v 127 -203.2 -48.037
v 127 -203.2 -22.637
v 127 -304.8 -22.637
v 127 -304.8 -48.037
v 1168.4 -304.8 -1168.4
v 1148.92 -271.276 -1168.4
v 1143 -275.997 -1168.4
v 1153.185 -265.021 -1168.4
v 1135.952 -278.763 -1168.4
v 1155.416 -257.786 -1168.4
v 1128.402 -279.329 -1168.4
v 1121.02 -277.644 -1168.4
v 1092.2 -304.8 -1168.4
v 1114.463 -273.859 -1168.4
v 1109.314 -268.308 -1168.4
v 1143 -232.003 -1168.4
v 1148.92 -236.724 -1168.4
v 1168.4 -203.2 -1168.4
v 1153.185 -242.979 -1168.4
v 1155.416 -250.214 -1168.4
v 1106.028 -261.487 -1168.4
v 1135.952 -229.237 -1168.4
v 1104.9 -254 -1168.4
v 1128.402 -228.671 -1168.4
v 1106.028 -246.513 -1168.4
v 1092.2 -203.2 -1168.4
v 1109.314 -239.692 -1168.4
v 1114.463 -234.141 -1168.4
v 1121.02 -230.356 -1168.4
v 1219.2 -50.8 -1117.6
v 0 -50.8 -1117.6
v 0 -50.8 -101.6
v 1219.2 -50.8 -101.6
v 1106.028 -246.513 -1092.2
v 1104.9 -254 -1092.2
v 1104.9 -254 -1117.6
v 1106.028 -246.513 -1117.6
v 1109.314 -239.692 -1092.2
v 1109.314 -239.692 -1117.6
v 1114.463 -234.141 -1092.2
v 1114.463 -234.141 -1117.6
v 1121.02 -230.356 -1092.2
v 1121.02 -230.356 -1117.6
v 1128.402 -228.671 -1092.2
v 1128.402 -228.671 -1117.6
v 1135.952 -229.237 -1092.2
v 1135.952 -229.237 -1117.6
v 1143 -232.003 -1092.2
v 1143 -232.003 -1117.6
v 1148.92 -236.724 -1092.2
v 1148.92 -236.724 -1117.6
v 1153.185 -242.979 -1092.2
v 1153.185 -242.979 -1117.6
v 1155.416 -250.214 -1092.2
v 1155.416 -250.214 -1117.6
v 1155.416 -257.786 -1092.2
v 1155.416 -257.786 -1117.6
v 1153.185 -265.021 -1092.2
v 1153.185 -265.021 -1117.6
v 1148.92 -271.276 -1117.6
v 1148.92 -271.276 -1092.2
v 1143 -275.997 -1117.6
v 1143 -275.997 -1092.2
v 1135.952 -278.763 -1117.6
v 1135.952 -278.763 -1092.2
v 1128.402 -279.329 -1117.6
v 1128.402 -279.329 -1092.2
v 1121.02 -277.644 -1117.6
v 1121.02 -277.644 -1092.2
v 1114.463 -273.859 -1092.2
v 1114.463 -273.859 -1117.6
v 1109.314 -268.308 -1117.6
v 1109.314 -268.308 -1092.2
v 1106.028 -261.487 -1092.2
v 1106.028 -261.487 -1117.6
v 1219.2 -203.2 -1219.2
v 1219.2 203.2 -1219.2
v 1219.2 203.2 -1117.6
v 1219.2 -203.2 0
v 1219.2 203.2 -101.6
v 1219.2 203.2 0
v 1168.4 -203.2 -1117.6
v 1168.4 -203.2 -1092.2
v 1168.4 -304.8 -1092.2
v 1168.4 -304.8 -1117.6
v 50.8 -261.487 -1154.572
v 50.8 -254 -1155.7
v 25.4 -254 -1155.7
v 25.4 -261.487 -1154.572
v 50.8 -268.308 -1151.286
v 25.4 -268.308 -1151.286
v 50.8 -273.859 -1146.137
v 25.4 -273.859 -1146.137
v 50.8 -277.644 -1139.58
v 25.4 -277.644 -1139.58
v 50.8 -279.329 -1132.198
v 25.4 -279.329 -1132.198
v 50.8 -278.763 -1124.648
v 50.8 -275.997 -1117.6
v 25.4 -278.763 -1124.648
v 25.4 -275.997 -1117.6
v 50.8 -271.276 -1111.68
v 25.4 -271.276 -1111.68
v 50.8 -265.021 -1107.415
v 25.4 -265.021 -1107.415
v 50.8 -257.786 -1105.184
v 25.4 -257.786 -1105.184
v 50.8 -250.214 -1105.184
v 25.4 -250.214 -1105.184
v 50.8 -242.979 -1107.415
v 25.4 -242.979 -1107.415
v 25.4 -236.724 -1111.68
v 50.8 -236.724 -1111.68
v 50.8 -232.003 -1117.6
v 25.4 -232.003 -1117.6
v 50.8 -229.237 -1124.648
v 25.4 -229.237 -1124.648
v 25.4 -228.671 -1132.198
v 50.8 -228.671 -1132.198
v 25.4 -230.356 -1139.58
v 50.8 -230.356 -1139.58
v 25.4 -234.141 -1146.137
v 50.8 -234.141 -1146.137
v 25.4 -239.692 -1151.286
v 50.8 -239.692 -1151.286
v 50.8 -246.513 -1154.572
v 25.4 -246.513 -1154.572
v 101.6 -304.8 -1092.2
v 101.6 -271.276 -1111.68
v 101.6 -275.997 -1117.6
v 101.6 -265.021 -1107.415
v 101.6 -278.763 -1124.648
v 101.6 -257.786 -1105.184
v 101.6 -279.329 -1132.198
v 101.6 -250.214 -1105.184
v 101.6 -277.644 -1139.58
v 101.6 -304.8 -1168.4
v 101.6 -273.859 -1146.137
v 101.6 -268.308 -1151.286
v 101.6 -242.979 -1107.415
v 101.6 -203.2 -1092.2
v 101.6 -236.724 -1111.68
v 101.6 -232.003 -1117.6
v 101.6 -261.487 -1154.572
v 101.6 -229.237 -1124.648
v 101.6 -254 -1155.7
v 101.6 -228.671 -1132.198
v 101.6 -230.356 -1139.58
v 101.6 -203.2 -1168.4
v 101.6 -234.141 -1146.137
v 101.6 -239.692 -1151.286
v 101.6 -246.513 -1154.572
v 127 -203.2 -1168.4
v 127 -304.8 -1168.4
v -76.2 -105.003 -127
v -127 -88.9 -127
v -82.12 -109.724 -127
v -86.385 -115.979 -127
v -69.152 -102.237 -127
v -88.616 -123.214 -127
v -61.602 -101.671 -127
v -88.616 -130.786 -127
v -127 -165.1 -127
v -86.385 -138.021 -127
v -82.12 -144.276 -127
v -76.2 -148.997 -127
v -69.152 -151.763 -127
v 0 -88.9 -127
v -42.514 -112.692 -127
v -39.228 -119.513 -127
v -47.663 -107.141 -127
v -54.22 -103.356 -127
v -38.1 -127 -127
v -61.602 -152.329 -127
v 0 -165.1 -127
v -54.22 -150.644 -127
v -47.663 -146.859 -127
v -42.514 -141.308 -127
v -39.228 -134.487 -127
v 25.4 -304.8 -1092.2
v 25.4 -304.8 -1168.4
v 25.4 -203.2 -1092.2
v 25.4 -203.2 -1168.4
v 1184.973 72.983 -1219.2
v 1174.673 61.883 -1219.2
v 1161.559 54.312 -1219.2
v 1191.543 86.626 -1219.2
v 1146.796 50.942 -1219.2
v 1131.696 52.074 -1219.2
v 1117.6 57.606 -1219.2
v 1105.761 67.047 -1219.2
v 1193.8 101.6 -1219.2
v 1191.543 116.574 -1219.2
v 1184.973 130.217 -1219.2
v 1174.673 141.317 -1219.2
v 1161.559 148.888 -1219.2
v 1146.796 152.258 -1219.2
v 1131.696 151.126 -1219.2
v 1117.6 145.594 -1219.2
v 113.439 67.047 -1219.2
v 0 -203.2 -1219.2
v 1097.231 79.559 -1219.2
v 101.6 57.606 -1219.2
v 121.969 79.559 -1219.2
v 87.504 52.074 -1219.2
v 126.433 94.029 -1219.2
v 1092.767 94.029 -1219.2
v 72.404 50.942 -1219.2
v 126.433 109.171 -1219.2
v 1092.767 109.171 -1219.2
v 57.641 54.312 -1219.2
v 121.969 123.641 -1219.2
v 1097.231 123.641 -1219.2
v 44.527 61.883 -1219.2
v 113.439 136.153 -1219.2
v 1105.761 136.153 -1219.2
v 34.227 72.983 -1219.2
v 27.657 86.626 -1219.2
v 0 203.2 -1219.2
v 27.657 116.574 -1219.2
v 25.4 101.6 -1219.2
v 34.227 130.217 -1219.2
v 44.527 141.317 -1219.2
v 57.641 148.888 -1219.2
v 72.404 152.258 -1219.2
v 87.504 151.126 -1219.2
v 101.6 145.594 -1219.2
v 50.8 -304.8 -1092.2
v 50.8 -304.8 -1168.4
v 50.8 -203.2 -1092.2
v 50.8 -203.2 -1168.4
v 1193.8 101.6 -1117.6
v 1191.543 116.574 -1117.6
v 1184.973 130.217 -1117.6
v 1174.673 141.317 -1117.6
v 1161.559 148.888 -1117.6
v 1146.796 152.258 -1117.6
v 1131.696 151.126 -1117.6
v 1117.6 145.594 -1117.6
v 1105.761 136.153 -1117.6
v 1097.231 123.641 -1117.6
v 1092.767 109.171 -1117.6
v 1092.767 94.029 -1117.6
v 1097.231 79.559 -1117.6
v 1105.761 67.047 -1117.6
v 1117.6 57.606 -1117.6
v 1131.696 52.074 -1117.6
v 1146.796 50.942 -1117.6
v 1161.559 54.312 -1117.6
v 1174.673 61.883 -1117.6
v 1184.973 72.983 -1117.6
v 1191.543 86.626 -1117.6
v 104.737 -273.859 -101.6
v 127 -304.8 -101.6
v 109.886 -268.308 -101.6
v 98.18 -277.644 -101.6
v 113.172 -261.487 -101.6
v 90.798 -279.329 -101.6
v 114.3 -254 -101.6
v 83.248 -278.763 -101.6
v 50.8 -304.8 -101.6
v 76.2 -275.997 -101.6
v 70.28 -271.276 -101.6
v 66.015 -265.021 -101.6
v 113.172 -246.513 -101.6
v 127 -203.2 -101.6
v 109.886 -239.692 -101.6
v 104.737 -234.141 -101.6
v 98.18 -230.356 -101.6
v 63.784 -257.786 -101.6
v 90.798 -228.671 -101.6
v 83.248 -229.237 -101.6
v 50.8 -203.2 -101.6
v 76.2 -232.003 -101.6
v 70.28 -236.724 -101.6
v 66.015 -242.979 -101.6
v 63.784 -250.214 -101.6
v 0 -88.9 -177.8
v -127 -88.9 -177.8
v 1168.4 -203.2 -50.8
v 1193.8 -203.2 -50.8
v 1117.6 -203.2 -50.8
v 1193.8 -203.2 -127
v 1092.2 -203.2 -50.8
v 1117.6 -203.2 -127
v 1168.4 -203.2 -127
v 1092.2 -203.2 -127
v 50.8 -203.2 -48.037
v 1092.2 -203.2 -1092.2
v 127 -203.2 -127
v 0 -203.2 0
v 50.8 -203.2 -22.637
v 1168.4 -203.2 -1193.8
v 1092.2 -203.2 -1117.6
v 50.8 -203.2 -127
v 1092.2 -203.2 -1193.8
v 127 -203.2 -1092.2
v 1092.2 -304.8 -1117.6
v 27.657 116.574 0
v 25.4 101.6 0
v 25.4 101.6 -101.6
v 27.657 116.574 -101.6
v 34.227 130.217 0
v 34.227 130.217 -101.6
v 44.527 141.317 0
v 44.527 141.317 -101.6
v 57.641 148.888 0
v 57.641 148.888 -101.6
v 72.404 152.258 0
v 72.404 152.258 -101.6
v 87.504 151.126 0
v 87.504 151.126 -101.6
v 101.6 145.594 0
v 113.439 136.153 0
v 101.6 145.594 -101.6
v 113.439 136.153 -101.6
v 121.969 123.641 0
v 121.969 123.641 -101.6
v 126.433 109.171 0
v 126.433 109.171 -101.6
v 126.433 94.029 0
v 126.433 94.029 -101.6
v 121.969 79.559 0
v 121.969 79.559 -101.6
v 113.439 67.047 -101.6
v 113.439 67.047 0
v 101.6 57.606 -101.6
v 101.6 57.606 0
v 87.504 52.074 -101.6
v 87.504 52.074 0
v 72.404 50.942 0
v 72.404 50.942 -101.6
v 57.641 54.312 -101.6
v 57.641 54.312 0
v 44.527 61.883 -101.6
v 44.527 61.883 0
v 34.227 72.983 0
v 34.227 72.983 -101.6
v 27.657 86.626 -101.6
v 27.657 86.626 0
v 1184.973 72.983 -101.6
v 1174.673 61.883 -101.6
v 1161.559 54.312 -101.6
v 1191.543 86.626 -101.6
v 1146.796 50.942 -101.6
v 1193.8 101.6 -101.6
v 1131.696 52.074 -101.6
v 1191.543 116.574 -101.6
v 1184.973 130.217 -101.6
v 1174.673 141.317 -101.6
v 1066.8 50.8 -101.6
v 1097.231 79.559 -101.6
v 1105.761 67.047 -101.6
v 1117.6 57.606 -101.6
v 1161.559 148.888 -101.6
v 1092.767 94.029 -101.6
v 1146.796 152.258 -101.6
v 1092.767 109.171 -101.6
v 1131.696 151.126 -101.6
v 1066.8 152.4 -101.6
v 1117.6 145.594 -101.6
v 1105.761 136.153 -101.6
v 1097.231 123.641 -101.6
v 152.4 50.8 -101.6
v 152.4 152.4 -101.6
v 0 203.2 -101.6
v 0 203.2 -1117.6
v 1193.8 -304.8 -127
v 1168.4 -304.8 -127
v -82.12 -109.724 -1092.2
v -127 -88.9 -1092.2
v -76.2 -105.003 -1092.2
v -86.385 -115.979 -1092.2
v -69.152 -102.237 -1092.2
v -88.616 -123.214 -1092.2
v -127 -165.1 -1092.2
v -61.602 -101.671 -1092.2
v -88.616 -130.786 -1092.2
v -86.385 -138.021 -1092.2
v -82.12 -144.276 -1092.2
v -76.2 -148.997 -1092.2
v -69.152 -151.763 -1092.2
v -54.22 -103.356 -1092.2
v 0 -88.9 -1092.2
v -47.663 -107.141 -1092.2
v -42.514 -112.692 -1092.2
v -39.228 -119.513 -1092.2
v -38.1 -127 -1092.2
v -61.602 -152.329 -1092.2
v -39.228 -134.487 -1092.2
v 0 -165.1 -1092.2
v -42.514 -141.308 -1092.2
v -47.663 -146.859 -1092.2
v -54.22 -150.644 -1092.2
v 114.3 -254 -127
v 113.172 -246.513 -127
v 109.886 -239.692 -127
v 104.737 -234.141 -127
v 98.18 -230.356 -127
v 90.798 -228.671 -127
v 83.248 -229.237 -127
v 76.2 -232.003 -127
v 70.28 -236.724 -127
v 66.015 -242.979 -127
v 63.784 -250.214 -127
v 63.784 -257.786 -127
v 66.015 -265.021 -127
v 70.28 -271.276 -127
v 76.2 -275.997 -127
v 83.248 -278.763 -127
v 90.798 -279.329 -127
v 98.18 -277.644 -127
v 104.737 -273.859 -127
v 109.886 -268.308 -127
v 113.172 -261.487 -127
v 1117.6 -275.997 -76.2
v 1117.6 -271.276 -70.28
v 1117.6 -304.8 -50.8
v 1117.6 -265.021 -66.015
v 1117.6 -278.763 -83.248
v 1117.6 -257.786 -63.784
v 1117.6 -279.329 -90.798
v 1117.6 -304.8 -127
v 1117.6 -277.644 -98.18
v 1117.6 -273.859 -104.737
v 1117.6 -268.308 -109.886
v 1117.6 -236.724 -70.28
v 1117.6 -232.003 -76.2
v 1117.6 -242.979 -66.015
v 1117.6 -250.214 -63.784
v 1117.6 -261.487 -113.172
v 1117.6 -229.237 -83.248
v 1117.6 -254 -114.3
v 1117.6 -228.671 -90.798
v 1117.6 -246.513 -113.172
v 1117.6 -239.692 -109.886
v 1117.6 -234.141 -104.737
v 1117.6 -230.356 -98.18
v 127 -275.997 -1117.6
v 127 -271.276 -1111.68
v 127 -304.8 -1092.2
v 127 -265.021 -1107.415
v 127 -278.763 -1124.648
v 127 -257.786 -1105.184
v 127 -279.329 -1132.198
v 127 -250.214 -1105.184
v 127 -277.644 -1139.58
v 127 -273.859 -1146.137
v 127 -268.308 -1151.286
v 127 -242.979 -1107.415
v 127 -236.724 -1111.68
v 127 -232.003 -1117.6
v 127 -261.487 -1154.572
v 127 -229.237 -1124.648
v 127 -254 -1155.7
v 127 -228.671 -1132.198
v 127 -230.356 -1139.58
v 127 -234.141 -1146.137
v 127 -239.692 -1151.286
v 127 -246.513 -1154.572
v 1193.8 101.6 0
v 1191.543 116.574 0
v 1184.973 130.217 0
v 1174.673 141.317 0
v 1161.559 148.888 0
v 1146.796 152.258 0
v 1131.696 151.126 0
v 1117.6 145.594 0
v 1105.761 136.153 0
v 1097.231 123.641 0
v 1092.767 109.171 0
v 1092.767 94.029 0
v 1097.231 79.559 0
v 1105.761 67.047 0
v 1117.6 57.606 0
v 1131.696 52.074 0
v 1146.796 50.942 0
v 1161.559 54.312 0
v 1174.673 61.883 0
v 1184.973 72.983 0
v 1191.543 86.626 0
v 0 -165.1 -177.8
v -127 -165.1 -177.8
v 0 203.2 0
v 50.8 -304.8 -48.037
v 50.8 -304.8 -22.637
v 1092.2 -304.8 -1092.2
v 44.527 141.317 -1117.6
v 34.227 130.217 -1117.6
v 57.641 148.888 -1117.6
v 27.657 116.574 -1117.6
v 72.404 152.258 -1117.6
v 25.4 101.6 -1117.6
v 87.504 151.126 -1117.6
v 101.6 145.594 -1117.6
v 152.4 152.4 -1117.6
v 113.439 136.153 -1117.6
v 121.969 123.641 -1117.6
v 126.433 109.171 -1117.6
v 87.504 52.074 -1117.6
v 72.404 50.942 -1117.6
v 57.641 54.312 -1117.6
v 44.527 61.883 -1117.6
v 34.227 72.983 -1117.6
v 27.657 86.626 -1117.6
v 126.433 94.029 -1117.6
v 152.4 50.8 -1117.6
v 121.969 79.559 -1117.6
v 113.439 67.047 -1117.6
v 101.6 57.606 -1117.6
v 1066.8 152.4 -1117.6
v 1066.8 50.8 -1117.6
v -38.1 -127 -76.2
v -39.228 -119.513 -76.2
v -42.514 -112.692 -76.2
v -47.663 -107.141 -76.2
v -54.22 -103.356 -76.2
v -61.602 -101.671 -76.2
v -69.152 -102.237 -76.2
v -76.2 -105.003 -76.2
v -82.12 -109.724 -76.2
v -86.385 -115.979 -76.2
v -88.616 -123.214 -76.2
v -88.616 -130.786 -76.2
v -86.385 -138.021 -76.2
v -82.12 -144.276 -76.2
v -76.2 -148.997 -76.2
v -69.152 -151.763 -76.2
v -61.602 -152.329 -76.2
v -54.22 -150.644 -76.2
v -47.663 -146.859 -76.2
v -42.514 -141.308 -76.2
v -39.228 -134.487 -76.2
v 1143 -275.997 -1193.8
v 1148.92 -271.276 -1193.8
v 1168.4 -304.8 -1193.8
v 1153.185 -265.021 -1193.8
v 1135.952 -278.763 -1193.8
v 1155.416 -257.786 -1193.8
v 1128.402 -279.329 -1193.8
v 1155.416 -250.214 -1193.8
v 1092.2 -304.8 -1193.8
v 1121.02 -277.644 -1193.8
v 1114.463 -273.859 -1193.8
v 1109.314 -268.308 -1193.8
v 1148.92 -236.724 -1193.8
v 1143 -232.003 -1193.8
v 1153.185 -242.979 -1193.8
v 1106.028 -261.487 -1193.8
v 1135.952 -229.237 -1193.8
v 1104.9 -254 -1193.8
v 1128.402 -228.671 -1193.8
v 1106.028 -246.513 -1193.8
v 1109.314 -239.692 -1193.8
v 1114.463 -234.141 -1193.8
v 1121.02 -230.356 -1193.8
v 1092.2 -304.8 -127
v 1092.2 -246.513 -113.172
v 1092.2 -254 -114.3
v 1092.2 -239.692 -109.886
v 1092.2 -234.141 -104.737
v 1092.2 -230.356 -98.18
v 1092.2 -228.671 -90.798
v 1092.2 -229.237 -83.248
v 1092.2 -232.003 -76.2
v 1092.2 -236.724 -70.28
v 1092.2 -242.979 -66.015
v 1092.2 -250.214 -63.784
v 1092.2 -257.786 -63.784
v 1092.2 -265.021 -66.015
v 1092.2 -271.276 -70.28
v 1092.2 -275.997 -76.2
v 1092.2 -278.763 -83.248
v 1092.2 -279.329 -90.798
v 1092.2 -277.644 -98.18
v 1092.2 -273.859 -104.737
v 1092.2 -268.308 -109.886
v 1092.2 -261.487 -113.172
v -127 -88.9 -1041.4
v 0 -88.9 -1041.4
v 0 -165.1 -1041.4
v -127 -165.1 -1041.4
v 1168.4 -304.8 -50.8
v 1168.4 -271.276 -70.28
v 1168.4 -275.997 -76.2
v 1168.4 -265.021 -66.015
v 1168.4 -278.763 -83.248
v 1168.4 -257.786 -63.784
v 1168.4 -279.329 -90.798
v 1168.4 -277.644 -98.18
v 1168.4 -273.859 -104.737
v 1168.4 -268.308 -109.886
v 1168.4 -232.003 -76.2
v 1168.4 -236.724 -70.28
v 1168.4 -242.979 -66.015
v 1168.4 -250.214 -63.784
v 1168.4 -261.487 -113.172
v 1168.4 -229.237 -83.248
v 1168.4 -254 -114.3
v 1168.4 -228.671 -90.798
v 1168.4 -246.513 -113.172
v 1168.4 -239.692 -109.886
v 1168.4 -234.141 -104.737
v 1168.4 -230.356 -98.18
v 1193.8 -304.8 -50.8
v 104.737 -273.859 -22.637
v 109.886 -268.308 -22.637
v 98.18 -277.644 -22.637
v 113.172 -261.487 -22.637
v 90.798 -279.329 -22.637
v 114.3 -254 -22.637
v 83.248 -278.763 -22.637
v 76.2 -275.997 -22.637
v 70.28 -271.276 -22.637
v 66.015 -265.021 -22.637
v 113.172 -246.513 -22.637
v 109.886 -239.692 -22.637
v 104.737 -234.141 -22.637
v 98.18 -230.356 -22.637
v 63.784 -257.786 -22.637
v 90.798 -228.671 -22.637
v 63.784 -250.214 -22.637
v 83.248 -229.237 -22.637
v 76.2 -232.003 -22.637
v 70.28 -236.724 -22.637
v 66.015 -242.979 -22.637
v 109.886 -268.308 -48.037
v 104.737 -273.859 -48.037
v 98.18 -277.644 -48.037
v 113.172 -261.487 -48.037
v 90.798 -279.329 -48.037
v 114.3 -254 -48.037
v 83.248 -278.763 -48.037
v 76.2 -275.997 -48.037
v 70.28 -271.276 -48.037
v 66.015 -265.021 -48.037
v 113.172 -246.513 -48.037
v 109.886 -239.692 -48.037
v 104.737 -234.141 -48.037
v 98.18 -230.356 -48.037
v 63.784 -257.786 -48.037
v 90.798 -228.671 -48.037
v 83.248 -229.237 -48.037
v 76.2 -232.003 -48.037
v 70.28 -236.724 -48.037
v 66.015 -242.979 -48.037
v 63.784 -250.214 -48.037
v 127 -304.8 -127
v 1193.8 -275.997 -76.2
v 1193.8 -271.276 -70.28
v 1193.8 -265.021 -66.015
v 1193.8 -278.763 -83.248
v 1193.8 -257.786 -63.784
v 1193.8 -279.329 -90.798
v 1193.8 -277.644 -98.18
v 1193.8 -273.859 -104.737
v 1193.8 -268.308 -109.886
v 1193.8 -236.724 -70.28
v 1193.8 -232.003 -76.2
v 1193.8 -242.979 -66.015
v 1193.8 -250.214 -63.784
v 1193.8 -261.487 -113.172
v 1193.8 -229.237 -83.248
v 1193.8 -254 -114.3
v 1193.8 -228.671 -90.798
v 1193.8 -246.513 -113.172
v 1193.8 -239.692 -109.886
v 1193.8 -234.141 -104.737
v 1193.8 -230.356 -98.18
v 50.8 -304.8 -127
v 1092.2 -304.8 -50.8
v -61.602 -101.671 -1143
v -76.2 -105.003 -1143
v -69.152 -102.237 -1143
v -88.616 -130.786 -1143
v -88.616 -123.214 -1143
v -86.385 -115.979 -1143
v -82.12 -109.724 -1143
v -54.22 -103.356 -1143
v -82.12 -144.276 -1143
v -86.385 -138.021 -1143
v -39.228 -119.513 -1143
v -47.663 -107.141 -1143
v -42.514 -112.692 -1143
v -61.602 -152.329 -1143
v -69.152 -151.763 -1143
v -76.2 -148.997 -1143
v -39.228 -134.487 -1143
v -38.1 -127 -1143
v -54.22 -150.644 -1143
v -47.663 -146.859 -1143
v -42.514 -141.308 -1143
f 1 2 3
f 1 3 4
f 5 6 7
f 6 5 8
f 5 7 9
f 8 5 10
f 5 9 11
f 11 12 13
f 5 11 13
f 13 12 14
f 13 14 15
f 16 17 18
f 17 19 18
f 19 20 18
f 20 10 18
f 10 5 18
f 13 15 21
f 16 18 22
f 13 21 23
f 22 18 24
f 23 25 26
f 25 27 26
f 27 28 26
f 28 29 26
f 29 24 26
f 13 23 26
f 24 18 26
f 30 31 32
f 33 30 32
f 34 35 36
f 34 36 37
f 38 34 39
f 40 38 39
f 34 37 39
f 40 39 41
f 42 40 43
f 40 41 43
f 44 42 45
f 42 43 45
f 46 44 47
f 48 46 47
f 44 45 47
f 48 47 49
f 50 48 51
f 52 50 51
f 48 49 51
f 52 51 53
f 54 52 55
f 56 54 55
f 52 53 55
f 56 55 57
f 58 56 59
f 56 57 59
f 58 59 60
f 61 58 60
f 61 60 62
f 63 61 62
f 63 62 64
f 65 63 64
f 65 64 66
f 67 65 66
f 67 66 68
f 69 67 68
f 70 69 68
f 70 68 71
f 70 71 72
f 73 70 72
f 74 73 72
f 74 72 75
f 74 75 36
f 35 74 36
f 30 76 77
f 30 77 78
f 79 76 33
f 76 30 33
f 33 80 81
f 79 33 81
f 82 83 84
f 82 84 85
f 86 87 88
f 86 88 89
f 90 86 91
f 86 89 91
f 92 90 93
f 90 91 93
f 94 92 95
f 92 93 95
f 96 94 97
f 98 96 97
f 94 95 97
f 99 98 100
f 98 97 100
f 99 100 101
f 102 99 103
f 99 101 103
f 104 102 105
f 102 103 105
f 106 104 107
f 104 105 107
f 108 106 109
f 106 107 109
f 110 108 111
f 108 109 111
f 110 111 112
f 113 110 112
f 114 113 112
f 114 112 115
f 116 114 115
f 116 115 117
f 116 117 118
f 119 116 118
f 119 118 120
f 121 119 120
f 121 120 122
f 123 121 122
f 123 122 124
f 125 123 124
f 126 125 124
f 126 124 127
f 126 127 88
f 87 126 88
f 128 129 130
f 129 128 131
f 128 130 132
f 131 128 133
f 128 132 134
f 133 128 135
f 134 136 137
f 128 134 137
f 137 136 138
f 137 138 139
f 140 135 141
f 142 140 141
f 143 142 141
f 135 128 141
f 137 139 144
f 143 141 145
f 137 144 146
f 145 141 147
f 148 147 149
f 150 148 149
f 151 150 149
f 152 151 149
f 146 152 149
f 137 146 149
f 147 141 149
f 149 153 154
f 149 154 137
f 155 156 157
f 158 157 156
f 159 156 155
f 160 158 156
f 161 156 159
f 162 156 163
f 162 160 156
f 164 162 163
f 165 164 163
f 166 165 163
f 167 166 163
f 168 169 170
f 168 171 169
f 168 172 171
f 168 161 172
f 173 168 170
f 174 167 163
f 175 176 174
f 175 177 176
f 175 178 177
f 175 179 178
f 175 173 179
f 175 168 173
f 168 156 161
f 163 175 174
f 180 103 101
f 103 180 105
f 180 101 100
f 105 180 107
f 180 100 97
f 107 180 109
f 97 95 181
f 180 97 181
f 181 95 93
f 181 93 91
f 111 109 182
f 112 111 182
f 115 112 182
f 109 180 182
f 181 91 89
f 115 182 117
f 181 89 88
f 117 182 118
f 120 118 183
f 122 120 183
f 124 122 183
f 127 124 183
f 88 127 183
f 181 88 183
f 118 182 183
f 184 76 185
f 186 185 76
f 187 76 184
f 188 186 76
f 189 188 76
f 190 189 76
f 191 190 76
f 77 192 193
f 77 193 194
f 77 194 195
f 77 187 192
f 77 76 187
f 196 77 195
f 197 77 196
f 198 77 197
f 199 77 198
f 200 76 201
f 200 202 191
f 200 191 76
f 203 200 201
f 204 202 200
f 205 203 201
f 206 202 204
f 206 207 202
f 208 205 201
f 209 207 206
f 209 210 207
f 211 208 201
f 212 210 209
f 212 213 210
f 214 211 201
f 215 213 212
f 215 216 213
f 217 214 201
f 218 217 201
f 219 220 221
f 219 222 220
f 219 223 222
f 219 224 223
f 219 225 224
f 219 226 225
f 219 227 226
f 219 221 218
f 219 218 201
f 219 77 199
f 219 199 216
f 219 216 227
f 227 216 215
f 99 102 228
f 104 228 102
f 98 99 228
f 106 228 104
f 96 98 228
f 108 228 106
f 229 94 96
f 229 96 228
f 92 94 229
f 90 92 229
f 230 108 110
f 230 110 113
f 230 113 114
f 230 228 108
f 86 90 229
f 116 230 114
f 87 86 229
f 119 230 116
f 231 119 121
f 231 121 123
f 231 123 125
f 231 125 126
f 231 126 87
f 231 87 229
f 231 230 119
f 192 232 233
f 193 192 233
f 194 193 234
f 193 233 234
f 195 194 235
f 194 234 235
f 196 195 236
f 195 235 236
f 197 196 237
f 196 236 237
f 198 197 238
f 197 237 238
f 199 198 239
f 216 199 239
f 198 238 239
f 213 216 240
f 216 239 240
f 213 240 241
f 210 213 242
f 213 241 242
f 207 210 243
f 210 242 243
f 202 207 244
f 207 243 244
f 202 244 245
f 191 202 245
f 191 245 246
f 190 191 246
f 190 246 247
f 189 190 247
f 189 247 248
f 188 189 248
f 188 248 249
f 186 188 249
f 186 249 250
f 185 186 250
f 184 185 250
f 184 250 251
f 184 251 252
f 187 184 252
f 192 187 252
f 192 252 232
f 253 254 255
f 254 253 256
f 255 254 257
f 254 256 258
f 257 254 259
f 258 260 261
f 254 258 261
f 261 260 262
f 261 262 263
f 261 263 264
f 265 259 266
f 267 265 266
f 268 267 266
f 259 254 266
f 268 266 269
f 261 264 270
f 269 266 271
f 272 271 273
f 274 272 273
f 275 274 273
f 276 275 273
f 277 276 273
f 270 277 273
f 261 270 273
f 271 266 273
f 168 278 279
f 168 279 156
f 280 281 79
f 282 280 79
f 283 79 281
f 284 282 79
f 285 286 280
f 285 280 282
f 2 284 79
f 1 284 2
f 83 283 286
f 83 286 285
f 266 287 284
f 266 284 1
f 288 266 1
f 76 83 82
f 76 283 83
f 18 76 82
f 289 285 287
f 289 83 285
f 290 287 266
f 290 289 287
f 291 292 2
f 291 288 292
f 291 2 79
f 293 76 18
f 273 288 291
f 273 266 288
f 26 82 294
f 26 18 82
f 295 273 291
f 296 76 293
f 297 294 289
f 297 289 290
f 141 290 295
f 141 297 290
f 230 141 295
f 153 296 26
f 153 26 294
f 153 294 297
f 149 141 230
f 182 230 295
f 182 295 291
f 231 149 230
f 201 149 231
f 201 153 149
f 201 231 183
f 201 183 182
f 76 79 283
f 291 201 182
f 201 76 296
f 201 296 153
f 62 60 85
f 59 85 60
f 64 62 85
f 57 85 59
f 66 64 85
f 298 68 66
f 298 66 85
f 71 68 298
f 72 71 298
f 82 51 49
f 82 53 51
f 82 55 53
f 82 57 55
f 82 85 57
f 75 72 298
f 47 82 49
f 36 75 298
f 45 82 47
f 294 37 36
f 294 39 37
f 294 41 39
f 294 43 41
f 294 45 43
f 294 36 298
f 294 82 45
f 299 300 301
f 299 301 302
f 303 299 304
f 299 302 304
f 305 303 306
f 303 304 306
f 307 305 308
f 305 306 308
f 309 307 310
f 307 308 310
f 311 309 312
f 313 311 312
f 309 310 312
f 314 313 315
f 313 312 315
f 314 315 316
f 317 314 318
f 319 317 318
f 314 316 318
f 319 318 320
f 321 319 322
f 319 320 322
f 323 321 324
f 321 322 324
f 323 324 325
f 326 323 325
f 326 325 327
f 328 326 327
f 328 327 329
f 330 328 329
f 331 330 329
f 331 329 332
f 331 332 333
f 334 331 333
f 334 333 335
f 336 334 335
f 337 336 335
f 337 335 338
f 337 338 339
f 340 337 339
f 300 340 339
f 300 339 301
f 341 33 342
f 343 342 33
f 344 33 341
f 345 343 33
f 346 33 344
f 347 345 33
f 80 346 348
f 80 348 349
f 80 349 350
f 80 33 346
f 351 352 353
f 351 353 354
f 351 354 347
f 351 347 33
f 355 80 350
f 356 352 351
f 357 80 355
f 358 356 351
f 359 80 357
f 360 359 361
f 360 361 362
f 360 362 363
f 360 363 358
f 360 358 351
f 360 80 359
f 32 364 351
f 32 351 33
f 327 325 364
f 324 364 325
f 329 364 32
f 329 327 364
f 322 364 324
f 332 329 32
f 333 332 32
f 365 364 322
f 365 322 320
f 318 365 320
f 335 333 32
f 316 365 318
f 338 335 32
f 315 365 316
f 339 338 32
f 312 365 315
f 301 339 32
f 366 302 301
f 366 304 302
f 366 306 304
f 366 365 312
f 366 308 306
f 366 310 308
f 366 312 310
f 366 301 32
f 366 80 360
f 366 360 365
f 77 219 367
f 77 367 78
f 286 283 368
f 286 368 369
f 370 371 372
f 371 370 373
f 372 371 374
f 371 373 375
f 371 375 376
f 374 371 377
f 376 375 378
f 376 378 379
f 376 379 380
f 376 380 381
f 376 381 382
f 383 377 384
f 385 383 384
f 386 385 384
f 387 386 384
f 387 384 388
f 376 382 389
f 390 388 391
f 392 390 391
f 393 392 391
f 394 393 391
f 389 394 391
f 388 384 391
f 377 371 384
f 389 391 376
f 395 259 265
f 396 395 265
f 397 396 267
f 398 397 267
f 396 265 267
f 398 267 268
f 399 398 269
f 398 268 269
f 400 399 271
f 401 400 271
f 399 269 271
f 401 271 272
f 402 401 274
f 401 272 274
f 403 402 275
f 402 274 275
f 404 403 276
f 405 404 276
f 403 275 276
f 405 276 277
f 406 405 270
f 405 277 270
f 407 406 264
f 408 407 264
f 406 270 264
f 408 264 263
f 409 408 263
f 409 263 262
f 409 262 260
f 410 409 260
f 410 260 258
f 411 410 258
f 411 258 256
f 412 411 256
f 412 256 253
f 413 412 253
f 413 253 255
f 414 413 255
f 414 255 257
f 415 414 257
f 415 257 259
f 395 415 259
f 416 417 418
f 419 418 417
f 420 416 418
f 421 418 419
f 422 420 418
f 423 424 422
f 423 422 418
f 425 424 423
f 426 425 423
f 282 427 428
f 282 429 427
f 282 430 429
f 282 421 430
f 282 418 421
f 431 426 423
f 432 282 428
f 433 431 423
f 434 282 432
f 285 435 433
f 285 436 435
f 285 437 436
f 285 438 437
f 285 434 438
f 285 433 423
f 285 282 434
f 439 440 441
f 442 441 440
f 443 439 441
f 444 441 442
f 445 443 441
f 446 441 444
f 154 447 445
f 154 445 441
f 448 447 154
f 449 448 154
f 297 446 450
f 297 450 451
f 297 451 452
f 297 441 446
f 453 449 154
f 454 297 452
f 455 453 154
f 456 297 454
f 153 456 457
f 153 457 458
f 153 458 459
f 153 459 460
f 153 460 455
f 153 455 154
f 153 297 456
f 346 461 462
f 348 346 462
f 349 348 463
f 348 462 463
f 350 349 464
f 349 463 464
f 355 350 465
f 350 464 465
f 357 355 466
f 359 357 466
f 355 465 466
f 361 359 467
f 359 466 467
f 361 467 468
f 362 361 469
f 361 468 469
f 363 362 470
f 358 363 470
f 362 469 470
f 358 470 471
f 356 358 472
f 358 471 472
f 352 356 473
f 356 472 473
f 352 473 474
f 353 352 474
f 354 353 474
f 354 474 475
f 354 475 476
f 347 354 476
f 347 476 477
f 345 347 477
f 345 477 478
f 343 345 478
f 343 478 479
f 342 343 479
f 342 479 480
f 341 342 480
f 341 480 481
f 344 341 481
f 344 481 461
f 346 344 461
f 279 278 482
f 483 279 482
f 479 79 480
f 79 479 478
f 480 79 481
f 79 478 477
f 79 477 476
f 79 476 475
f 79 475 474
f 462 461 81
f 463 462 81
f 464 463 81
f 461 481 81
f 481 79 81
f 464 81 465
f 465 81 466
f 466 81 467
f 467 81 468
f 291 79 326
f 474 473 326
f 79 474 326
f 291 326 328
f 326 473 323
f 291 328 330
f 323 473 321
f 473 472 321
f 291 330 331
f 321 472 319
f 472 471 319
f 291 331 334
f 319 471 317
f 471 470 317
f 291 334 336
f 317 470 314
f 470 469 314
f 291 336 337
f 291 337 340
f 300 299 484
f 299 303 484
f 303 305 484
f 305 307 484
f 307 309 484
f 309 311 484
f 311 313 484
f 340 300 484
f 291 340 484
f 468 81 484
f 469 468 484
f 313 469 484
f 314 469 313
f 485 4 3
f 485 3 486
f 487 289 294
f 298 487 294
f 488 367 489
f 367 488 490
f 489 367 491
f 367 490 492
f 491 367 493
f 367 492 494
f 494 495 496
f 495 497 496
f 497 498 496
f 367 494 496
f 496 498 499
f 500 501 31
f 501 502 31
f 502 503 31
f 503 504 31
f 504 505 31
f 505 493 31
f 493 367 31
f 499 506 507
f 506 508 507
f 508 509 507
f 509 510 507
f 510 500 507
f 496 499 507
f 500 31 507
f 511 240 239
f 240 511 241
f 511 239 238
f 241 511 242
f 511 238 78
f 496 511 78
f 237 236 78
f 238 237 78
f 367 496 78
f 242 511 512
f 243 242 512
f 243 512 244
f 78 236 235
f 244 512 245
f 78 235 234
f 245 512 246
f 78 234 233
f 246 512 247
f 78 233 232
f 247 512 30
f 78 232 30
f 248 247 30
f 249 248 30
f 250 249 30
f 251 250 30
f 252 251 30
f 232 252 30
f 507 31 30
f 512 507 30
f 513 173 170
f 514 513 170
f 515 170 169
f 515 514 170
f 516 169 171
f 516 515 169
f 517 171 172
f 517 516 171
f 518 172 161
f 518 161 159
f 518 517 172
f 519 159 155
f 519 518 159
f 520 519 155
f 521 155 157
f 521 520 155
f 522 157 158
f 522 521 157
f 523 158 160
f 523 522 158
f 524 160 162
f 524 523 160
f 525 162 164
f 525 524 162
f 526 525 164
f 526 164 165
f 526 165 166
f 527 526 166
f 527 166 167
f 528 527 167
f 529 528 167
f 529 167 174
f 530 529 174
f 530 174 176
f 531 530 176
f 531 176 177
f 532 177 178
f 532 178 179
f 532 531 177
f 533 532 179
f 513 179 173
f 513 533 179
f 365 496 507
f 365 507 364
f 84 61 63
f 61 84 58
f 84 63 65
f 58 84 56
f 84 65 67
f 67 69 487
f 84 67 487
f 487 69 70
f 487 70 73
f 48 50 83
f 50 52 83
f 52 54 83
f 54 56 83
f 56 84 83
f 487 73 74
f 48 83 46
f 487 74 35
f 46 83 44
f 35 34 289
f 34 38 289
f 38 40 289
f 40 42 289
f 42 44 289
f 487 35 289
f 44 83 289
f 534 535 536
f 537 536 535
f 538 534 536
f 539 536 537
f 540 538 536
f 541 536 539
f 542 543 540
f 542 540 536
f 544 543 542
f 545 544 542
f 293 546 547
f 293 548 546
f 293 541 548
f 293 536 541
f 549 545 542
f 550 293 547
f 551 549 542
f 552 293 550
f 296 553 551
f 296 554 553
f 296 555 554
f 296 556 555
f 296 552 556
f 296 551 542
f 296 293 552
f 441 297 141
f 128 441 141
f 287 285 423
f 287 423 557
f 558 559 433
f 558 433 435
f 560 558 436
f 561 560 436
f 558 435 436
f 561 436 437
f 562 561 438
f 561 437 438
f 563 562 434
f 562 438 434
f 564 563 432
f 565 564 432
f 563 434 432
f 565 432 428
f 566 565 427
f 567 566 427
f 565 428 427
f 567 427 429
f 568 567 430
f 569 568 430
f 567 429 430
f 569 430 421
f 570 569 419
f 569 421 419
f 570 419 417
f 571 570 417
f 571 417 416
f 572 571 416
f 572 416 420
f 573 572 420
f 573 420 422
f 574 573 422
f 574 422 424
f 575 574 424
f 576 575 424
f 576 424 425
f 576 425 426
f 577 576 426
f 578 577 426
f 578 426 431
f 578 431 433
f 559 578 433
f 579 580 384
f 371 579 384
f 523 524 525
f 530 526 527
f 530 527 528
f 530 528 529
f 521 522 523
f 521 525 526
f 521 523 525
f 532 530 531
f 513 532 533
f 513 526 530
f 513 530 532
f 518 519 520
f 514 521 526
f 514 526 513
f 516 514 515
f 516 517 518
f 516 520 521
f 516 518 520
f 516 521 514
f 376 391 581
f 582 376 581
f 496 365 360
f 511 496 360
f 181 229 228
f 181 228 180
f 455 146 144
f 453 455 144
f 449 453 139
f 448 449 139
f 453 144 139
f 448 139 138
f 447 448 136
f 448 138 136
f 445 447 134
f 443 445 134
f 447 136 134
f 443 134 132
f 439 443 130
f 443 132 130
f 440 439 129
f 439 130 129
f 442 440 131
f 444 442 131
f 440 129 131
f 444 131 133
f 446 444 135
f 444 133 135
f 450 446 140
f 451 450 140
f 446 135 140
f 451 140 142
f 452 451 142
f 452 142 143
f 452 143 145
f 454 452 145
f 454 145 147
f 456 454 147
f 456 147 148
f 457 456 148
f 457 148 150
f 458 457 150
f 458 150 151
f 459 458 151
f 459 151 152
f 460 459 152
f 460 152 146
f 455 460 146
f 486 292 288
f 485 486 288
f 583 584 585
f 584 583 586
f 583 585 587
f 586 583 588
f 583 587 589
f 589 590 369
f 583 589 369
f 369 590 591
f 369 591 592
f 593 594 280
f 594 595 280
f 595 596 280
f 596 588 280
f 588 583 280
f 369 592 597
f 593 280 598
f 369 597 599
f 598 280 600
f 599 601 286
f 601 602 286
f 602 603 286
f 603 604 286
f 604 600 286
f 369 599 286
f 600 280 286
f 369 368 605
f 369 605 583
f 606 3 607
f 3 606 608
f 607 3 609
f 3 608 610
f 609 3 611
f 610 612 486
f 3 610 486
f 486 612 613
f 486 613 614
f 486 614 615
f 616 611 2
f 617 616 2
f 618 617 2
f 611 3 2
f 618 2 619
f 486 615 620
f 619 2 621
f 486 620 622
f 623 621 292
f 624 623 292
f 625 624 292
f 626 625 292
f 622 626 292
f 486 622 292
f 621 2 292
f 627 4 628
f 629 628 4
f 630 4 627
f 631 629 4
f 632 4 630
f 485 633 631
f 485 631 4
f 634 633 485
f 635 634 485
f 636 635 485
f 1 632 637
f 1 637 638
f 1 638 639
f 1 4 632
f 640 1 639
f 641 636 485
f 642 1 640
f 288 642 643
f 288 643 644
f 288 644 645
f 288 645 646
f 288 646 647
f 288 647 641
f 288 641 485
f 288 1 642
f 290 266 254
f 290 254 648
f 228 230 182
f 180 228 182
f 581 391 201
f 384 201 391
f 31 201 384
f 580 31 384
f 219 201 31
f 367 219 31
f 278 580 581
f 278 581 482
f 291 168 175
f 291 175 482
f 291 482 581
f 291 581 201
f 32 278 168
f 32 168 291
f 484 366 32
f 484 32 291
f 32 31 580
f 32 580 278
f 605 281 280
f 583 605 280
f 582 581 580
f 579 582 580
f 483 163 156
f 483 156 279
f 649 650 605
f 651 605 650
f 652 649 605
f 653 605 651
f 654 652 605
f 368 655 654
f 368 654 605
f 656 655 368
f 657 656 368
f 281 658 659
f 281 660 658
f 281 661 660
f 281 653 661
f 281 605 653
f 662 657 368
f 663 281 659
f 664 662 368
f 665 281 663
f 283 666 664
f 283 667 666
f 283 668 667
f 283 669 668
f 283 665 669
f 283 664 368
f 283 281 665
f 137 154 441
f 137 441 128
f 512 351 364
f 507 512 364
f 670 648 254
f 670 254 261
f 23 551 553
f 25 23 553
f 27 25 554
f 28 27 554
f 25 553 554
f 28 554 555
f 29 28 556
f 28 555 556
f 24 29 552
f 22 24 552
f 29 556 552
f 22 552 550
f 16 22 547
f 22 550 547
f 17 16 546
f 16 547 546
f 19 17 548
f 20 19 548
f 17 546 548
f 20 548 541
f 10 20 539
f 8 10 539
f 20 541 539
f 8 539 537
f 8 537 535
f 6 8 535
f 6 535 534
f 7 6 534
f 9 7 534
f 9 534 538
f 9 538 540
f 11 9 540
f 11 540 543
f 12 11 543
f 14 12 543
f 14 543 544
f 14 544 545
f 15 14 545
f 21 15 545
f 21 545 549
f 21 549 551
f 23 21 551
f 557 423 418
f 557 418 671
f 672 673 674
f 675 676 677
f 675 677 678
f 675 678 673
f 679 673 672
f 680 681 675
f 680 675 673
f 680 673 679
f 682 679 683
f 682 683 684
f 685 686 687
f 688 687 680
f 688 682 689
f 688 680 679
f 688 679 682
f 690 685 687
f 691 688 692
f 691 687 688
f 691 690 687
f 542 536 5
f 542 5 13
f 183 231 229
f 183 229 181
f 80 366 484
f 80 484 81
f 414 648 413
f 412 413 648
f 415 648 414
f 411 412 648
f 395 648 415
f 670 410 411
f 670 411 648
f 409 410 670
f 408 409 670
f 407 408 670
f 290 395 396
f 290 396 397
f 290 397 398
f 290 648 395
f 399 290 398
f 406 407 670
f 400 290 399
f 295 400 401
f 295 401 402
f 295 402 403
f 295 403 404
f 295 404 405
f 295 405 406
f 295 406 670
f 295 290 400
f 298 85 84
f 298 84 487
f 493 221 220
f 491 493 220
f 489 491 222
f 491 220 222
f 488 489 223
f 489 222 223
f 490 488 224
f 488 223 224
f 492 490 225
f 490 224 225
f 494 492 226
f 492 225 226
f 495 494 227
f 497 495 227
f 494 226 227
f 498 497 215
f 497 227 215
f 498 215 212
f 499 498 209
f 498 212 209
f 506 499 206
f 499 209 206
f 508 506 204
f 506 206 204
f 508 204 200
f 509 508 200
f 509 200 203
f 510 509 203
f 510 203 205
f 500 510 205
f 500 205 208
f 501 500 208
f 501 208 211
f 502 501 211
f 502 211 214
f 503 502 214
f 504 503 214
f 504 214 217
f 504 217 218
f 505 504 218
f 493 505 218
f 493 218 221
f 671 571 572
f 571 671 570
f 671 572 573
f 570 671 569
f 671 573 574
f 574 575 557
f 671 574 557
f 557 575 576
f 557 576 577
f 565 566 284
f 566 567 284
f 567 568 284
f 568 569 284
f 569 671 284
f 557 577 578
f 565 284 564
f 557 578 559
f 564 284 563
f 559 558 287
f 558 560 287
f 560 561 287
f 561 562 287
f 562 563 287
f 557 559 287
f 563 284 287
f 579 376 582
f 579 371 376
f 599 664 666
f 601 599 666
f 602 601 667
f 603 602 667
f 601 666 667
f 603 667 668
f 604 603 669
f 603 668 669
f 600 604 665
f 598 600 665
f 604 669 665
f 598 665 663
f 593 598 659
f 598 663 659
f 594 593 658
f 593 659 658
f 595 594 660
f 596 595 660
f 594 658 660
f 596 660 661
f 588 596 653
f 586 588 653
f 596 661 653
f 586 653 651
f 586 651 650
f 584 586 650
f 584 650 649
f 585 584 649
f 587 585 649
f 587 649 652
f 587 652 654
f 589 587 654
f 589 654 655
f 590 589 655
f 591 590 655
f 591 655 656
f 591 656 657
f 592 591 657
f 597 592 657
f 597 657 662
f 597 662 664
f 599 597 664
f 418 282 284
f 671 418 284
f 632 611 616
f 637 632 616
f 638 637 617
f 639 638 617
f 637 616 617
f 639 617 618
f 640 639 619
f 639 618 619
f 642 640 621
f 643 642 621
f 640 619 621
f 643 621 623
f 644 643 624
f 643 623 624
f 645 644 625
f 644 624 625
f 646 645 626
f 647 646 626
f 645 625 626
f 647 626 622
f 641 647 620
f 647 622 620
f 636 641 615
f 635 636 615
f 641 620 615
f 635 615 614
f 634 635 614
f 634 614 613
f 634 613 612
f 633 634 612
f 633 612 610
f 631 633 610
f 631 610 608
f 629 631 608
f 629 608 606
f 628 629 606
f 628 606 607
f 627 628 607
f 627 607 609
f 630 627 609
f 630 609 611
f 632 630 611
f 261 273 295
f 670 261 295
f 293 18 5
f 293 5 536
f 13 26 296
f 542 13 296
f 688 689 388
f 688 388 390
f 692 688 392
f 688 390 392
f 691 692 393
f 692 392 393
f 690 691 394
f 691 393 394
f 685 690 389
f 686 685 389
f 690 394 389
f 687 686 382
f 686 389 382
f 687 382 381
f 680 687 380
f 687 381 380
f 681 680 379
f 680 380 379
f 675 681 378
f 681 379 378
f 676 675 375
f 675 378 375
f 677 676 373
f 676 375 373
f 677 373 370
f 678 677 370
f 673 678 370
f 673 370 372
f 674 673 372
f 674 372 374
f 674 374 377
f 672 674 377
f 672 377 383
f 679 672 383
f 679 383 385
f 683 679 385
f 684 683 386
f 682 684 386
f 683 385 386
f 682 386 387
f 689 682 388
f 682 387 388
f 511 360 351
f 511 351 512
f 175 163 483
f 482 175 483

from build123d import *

# Parameters (mm, degrees)
BOSS_EXTRUDE1_DEPTH = 203.2
SKETCH2_W           = 1016
SKETCH2_H           = 1016
CUT_EXTRUDE1_DEPTH  = 50.8
SKETCH3_W           = 1016
SKETCH3_H           = 1016
CUT_EXTRUDE2_DEPTH  = 50.8
SKETCH4_W           = 1016
SKETCH4_H           = 101.6
CUT_EXTRUDE3_DEPTH  = 50.8
SKETCH5_W           = 1016
SKETCH5_H           = 101.6
CUT_EXTRUDE4_DEPTH  = 50.8
SKETCH6_R           = 50.8
CUT_EXTRUDE5_DEPTH  = 1270
SKETCH7_R           = 50.8
CUT_EXTRUDE6_DEPTH  = 1270
SKETCH8_W           = 1219.2
SKETCH8_H           = 101.6
BOSS_EXTRUDE2_DEPTH = 101.6
SKETCH9_W           = 1219.2
SKETCH9_H           = 1219.2
BOSS_EXTRUDE4_DEPTH = 101.6
SKETCH10_W          = 25.4
SKETCH10_H          = 76.2
SKETCH10_W_2        = 76.2
SKETCH10_H_2        = 25.4
BOSS_EXTRUDE5_DEPTH = 101.6
SKETCH12_R          = 25.4
CUT_EXTRUDE7_DEPTH  = 203.2
SKETCH13_R          = 25.4
CUT_EXTRUDE8_DEPTH  = 203.2
SKETCH14_R          = 25.4
CUT_EXTRUDE9_DEPTH  = 203.2
SKETCH15_R          = 25.4
CUT_EXTRUDE10_DEPTH = 203.2
SKETCH16_W          = 1016
SKETCH16_H          = 50.8
BOSS_EXTRUDE6_DEPTH = 1219.2
BOSS_EXTRUDE7_DEPTH = 127
SKETCH18_R          = 25.4
BOSS_EXTRUDE8_DEPTH = 50.8
BOSS_EXTRUDE9_START = 50.8
SKETCH19_R          = 25.4
BOSS_EXTRUDE9_DEPTH = 50.8


with BuildPart() as part:
    # Sketch1 → Boss-Extrude1 (new body)
    with BuildSketch(Plane(origin=(0, 0, 0), x_dir=(1, 0, 0), z_dir=(0, 1, 0))):
        Polygon((0, 0), (1219.2, 0), (1219.2, 101.6), (1117.6, 101.6), (1117.6, 1117.6), (1219.2, 1117.6), (1219.2, 1219.2), (0, 1219.2), (0, 1117.6), (101.6, 1117.6), (101.6, 101.6), (0, 101.6), align=None)
    extrude(amount=BOSS_EXTRUDE1_DEPTH)

    # Sketch2 → Cut-Extrude1 (cut)
    with BuildSketch(Plane(origin=(0, 203.2, 0), x_dir=(1, 0, 0), z_dir=(0, 1, 0))):
        with Locations((609.6, 609.6)):
            Rectangle(SKETCH2_W, SKETCH2_H)
    extrude(amount=-CUT_EXTRUDE1_DEPTH, mode=Mode.SUBTRACT)

    # Sketch3 → Cut-Extrude2 (cut)
    with BuildSketch(Plane(origin=(0, 0, 0), x_dir=(-1, 0, 0), z_dir=(0, -1, 0))):
        with Locations((-609.6, 609.6)):
            Rectangle(SKETCH3_W, SKETCH3_H)
    extrude(amount=-CUT_EXTRUDE2_DEPTH, mode=Mode.SUBTRACT)

    # Sketch4 → Cut-Extrude3 (cut)
    with BuildSketch(Plane(origin=(1117.6, 0, 0), x_dir=(0, 0, -1), z_dir=(1, 0, 0))):
        with Locations((609.6, 101.6)):
            Rectangle(SKETCH4_W, SKETCH4_H)
    extrude(amount=-CUT_EXTRUDE3_DEPTH, mode=Mode.SUBTRACT)

    # Sketch5 → Cut-Extrude4 (cut)
    with BuildSketch(Plane.ZY.offset(-101.6)):
        with Locations((-609.6, 101.6)):
            Rectangle(SKETCH5_W, SKETCH5_H)
    extrude(amount=-CUT_EXTRUDE4_DEPTH, mode=Mode.SUBTRACT)

    # Sketch6 → Cut-Extrude5 (cut)
    with BuildSketch(Plane.XY):
        with Locations((1143, 101.6)):
            Circle(SKETCH6_R)
    extrude(amount=-CUT_EXTRUDE5_DEPTH, mode=Mode.SUBTRACT)

    # Sketch7 → Cut-Extrude6 (cut)
    with BuildSketch(Plane(origin=(0, 0, -1219.2), x_dir=(-1, 0, 0), z_dir=(0, 0, -1))):
        with Locations((-76.2, 101.6)):
            Circle(SKETCH7_R)
    extrude(amount=-CUT_EXTRUDE6_DEPTH, mode=Mode.SUBTRACT)

    # Sketch8 → Boss-Extrude2 (add)
    with BuildSketch(Plane(origin=(0, 0, 0), x_dir=(-1, 0, 0), z_dir=(0, -1, 0))):
        with Locations((-609.6, 50.8)):
            Rectangle(SKETCH8_W, SKETCH8_H)
        with Locations((-609.6, 1168.4)):
            Rectangle(SKETCH8_W, SKETCH8_H)
    extrude(amount=BOSS_EXTRUDE2_DEPTH)

    # Sketch9 → Boss-Extrude4 (add)
    with BuildSketch(Plane(origin=(0, -101.6, 0), x_dir=(-1, 0, 0), z_dir=(0, -1, 0))):
        with Locations((-609.6, 609.6)):
            Rectangle(SKETCH9_W, SKETCH9_H)
    extrude(amount=BOSS_EXTRUDE4_DEPTH)

    # Sketch10 → Boss-Extrude5 (add)
    with BuildSketch(Plane(origin=(0, -203.2, 0), x_dir=(-1, 0, 0), z_dir=(0, -1, 0))):
        with Locations((-1104.9, 88.9)):
            Rectangle(SKETCH10_W, SKETCH10_H)
        with Locations((-1181.1, 88.9)):
            Rectangle(SKETCH10_W, SKETCH10_H)
        with Locations((-88.9, 114.3)):
            Rectangle(SKETCH10_W_2, SKETCH10_H_2)
        with Locations((-88.9, 35.337450191)):
            Rectangle(SKETCH10_W_2, SKETCH10_H_2)
        with Locations((-1130.3, 1104.9)):
            Rectangle(SKETCH10_W_2, SKETCH10_H_2)
        with Locations((-1130.3, 1181.1)):
            Rectangle(SKETCH10_W_2, SKETCH10_H_2)
        with Locations((-38.1, 1130.3)):
            Rectangle(SKETCH10_W, SKETCH10_H)
        with Locations((-114.3, 1130.3)):
            Rectangle(SKETCH10_W, SKETCH10_H)
    extrude(amount=BOSS_EXTRUDE5_DEPTH)

    # Sketch12 → Cut-Extrude7 (cut)
    with BuildSketch(Plane(origin=(1193.8, 0, 0), x_dir=(0, 0, -1), z_dir=(1, 0, 0))):
        with Locations((88.9, -254)):
            Circle(SKETCH12_R)
    extrude(amount=-CUT_EXTRUDE7_DEPTH, mode=Mode.SUBTRACT)

    # Sketch13 → Cut-Extrude8 (cut)
    with BuildSketch(Plane(origin=(0, 0, -1193.8), x_dir=(-1, 0, 0), z_dir=(0, 0, -1))):
        with Locations((-1130.3, -254)):
            Circle(SKETCH13_R)
    extrude(amount=-CUT_EXTRUDE8_DEPTH, mode=Mode.SUBTRACT)

    # Sketch14 → Cut-Extrude9 (cut)
    with BuildSketch(Plane.ZY.offset(-25.4)):
        with Locations(Location((-1130.3, -254, 0), (0, 0, 180))):
            Circle(SKETCH14_R)
    extrude(amount=-CUT_EXTRUDE9_DEPTH, mode=Mode.SUBTRACT)

    # Sketch15 → Cut-Extrude10 (cut)
    with BuildSketch(Plane.XY.offset(-22.637450191)):
        with Locations((88.9, -254)):
            Circle(SKETCH15_R)
    extrude(amount=-CUT_EXTRUDE10_DEPTH, mode=Mode.SUBTRACT)

    # Sketch16 → Boss-Extrude6 (add)
    with BuildSketch(Plane.ZY):
        with Locations((-609.6, -76.2)):
            Rectangle(SKETCH16_W, SKETCH16_H)
    extrude(amount=-BOSS_EXTRUDE6_DEPTH)

    # Sketch17 → Boss-Extrude7 (add)
    with BuildSketch(Plane.ZY):
        Polygon((-1092.2, -165.1), (-1041.4, -165.1), (-1041.4, -127), (-1041.4, -88.9), (-1092.2, -88.9), align=None)
        Polygon((-177.8, -127), (-177.8, -88.9), (-127, -88.9), (-127, -165.1), (-177.8, -165.1), align=None)
    extrude(amount=BOSS_EXTRUDE7_DEPTH)

    # Sketch18 → Boss-Extrude8 (add)
    with BuildSketch(Plane(origin=(0, 0, -1092.2), x_dir=(-1, 0, 0), z_dir=(0, 0, -1))):
        with Locations(Location((63.5, -127, 0), (0, 0, 180))):
            Circle(SKETCH18_R)
    extrude(amount=BOSS_EXTRUDE8_DEPTH)

    # Sketch19 → Boss-Extrude9 (add)
    with BuildSketch(Plane.XY.offset(-127).offset(BOSS_EXTRUDE9_START)):
        with Locations((-63.5, -127)):
            Circle(SKETCH19_R)
    extrude(amount=-BOSS_EXTRUDE9_DEPTH)


solid = part.part
